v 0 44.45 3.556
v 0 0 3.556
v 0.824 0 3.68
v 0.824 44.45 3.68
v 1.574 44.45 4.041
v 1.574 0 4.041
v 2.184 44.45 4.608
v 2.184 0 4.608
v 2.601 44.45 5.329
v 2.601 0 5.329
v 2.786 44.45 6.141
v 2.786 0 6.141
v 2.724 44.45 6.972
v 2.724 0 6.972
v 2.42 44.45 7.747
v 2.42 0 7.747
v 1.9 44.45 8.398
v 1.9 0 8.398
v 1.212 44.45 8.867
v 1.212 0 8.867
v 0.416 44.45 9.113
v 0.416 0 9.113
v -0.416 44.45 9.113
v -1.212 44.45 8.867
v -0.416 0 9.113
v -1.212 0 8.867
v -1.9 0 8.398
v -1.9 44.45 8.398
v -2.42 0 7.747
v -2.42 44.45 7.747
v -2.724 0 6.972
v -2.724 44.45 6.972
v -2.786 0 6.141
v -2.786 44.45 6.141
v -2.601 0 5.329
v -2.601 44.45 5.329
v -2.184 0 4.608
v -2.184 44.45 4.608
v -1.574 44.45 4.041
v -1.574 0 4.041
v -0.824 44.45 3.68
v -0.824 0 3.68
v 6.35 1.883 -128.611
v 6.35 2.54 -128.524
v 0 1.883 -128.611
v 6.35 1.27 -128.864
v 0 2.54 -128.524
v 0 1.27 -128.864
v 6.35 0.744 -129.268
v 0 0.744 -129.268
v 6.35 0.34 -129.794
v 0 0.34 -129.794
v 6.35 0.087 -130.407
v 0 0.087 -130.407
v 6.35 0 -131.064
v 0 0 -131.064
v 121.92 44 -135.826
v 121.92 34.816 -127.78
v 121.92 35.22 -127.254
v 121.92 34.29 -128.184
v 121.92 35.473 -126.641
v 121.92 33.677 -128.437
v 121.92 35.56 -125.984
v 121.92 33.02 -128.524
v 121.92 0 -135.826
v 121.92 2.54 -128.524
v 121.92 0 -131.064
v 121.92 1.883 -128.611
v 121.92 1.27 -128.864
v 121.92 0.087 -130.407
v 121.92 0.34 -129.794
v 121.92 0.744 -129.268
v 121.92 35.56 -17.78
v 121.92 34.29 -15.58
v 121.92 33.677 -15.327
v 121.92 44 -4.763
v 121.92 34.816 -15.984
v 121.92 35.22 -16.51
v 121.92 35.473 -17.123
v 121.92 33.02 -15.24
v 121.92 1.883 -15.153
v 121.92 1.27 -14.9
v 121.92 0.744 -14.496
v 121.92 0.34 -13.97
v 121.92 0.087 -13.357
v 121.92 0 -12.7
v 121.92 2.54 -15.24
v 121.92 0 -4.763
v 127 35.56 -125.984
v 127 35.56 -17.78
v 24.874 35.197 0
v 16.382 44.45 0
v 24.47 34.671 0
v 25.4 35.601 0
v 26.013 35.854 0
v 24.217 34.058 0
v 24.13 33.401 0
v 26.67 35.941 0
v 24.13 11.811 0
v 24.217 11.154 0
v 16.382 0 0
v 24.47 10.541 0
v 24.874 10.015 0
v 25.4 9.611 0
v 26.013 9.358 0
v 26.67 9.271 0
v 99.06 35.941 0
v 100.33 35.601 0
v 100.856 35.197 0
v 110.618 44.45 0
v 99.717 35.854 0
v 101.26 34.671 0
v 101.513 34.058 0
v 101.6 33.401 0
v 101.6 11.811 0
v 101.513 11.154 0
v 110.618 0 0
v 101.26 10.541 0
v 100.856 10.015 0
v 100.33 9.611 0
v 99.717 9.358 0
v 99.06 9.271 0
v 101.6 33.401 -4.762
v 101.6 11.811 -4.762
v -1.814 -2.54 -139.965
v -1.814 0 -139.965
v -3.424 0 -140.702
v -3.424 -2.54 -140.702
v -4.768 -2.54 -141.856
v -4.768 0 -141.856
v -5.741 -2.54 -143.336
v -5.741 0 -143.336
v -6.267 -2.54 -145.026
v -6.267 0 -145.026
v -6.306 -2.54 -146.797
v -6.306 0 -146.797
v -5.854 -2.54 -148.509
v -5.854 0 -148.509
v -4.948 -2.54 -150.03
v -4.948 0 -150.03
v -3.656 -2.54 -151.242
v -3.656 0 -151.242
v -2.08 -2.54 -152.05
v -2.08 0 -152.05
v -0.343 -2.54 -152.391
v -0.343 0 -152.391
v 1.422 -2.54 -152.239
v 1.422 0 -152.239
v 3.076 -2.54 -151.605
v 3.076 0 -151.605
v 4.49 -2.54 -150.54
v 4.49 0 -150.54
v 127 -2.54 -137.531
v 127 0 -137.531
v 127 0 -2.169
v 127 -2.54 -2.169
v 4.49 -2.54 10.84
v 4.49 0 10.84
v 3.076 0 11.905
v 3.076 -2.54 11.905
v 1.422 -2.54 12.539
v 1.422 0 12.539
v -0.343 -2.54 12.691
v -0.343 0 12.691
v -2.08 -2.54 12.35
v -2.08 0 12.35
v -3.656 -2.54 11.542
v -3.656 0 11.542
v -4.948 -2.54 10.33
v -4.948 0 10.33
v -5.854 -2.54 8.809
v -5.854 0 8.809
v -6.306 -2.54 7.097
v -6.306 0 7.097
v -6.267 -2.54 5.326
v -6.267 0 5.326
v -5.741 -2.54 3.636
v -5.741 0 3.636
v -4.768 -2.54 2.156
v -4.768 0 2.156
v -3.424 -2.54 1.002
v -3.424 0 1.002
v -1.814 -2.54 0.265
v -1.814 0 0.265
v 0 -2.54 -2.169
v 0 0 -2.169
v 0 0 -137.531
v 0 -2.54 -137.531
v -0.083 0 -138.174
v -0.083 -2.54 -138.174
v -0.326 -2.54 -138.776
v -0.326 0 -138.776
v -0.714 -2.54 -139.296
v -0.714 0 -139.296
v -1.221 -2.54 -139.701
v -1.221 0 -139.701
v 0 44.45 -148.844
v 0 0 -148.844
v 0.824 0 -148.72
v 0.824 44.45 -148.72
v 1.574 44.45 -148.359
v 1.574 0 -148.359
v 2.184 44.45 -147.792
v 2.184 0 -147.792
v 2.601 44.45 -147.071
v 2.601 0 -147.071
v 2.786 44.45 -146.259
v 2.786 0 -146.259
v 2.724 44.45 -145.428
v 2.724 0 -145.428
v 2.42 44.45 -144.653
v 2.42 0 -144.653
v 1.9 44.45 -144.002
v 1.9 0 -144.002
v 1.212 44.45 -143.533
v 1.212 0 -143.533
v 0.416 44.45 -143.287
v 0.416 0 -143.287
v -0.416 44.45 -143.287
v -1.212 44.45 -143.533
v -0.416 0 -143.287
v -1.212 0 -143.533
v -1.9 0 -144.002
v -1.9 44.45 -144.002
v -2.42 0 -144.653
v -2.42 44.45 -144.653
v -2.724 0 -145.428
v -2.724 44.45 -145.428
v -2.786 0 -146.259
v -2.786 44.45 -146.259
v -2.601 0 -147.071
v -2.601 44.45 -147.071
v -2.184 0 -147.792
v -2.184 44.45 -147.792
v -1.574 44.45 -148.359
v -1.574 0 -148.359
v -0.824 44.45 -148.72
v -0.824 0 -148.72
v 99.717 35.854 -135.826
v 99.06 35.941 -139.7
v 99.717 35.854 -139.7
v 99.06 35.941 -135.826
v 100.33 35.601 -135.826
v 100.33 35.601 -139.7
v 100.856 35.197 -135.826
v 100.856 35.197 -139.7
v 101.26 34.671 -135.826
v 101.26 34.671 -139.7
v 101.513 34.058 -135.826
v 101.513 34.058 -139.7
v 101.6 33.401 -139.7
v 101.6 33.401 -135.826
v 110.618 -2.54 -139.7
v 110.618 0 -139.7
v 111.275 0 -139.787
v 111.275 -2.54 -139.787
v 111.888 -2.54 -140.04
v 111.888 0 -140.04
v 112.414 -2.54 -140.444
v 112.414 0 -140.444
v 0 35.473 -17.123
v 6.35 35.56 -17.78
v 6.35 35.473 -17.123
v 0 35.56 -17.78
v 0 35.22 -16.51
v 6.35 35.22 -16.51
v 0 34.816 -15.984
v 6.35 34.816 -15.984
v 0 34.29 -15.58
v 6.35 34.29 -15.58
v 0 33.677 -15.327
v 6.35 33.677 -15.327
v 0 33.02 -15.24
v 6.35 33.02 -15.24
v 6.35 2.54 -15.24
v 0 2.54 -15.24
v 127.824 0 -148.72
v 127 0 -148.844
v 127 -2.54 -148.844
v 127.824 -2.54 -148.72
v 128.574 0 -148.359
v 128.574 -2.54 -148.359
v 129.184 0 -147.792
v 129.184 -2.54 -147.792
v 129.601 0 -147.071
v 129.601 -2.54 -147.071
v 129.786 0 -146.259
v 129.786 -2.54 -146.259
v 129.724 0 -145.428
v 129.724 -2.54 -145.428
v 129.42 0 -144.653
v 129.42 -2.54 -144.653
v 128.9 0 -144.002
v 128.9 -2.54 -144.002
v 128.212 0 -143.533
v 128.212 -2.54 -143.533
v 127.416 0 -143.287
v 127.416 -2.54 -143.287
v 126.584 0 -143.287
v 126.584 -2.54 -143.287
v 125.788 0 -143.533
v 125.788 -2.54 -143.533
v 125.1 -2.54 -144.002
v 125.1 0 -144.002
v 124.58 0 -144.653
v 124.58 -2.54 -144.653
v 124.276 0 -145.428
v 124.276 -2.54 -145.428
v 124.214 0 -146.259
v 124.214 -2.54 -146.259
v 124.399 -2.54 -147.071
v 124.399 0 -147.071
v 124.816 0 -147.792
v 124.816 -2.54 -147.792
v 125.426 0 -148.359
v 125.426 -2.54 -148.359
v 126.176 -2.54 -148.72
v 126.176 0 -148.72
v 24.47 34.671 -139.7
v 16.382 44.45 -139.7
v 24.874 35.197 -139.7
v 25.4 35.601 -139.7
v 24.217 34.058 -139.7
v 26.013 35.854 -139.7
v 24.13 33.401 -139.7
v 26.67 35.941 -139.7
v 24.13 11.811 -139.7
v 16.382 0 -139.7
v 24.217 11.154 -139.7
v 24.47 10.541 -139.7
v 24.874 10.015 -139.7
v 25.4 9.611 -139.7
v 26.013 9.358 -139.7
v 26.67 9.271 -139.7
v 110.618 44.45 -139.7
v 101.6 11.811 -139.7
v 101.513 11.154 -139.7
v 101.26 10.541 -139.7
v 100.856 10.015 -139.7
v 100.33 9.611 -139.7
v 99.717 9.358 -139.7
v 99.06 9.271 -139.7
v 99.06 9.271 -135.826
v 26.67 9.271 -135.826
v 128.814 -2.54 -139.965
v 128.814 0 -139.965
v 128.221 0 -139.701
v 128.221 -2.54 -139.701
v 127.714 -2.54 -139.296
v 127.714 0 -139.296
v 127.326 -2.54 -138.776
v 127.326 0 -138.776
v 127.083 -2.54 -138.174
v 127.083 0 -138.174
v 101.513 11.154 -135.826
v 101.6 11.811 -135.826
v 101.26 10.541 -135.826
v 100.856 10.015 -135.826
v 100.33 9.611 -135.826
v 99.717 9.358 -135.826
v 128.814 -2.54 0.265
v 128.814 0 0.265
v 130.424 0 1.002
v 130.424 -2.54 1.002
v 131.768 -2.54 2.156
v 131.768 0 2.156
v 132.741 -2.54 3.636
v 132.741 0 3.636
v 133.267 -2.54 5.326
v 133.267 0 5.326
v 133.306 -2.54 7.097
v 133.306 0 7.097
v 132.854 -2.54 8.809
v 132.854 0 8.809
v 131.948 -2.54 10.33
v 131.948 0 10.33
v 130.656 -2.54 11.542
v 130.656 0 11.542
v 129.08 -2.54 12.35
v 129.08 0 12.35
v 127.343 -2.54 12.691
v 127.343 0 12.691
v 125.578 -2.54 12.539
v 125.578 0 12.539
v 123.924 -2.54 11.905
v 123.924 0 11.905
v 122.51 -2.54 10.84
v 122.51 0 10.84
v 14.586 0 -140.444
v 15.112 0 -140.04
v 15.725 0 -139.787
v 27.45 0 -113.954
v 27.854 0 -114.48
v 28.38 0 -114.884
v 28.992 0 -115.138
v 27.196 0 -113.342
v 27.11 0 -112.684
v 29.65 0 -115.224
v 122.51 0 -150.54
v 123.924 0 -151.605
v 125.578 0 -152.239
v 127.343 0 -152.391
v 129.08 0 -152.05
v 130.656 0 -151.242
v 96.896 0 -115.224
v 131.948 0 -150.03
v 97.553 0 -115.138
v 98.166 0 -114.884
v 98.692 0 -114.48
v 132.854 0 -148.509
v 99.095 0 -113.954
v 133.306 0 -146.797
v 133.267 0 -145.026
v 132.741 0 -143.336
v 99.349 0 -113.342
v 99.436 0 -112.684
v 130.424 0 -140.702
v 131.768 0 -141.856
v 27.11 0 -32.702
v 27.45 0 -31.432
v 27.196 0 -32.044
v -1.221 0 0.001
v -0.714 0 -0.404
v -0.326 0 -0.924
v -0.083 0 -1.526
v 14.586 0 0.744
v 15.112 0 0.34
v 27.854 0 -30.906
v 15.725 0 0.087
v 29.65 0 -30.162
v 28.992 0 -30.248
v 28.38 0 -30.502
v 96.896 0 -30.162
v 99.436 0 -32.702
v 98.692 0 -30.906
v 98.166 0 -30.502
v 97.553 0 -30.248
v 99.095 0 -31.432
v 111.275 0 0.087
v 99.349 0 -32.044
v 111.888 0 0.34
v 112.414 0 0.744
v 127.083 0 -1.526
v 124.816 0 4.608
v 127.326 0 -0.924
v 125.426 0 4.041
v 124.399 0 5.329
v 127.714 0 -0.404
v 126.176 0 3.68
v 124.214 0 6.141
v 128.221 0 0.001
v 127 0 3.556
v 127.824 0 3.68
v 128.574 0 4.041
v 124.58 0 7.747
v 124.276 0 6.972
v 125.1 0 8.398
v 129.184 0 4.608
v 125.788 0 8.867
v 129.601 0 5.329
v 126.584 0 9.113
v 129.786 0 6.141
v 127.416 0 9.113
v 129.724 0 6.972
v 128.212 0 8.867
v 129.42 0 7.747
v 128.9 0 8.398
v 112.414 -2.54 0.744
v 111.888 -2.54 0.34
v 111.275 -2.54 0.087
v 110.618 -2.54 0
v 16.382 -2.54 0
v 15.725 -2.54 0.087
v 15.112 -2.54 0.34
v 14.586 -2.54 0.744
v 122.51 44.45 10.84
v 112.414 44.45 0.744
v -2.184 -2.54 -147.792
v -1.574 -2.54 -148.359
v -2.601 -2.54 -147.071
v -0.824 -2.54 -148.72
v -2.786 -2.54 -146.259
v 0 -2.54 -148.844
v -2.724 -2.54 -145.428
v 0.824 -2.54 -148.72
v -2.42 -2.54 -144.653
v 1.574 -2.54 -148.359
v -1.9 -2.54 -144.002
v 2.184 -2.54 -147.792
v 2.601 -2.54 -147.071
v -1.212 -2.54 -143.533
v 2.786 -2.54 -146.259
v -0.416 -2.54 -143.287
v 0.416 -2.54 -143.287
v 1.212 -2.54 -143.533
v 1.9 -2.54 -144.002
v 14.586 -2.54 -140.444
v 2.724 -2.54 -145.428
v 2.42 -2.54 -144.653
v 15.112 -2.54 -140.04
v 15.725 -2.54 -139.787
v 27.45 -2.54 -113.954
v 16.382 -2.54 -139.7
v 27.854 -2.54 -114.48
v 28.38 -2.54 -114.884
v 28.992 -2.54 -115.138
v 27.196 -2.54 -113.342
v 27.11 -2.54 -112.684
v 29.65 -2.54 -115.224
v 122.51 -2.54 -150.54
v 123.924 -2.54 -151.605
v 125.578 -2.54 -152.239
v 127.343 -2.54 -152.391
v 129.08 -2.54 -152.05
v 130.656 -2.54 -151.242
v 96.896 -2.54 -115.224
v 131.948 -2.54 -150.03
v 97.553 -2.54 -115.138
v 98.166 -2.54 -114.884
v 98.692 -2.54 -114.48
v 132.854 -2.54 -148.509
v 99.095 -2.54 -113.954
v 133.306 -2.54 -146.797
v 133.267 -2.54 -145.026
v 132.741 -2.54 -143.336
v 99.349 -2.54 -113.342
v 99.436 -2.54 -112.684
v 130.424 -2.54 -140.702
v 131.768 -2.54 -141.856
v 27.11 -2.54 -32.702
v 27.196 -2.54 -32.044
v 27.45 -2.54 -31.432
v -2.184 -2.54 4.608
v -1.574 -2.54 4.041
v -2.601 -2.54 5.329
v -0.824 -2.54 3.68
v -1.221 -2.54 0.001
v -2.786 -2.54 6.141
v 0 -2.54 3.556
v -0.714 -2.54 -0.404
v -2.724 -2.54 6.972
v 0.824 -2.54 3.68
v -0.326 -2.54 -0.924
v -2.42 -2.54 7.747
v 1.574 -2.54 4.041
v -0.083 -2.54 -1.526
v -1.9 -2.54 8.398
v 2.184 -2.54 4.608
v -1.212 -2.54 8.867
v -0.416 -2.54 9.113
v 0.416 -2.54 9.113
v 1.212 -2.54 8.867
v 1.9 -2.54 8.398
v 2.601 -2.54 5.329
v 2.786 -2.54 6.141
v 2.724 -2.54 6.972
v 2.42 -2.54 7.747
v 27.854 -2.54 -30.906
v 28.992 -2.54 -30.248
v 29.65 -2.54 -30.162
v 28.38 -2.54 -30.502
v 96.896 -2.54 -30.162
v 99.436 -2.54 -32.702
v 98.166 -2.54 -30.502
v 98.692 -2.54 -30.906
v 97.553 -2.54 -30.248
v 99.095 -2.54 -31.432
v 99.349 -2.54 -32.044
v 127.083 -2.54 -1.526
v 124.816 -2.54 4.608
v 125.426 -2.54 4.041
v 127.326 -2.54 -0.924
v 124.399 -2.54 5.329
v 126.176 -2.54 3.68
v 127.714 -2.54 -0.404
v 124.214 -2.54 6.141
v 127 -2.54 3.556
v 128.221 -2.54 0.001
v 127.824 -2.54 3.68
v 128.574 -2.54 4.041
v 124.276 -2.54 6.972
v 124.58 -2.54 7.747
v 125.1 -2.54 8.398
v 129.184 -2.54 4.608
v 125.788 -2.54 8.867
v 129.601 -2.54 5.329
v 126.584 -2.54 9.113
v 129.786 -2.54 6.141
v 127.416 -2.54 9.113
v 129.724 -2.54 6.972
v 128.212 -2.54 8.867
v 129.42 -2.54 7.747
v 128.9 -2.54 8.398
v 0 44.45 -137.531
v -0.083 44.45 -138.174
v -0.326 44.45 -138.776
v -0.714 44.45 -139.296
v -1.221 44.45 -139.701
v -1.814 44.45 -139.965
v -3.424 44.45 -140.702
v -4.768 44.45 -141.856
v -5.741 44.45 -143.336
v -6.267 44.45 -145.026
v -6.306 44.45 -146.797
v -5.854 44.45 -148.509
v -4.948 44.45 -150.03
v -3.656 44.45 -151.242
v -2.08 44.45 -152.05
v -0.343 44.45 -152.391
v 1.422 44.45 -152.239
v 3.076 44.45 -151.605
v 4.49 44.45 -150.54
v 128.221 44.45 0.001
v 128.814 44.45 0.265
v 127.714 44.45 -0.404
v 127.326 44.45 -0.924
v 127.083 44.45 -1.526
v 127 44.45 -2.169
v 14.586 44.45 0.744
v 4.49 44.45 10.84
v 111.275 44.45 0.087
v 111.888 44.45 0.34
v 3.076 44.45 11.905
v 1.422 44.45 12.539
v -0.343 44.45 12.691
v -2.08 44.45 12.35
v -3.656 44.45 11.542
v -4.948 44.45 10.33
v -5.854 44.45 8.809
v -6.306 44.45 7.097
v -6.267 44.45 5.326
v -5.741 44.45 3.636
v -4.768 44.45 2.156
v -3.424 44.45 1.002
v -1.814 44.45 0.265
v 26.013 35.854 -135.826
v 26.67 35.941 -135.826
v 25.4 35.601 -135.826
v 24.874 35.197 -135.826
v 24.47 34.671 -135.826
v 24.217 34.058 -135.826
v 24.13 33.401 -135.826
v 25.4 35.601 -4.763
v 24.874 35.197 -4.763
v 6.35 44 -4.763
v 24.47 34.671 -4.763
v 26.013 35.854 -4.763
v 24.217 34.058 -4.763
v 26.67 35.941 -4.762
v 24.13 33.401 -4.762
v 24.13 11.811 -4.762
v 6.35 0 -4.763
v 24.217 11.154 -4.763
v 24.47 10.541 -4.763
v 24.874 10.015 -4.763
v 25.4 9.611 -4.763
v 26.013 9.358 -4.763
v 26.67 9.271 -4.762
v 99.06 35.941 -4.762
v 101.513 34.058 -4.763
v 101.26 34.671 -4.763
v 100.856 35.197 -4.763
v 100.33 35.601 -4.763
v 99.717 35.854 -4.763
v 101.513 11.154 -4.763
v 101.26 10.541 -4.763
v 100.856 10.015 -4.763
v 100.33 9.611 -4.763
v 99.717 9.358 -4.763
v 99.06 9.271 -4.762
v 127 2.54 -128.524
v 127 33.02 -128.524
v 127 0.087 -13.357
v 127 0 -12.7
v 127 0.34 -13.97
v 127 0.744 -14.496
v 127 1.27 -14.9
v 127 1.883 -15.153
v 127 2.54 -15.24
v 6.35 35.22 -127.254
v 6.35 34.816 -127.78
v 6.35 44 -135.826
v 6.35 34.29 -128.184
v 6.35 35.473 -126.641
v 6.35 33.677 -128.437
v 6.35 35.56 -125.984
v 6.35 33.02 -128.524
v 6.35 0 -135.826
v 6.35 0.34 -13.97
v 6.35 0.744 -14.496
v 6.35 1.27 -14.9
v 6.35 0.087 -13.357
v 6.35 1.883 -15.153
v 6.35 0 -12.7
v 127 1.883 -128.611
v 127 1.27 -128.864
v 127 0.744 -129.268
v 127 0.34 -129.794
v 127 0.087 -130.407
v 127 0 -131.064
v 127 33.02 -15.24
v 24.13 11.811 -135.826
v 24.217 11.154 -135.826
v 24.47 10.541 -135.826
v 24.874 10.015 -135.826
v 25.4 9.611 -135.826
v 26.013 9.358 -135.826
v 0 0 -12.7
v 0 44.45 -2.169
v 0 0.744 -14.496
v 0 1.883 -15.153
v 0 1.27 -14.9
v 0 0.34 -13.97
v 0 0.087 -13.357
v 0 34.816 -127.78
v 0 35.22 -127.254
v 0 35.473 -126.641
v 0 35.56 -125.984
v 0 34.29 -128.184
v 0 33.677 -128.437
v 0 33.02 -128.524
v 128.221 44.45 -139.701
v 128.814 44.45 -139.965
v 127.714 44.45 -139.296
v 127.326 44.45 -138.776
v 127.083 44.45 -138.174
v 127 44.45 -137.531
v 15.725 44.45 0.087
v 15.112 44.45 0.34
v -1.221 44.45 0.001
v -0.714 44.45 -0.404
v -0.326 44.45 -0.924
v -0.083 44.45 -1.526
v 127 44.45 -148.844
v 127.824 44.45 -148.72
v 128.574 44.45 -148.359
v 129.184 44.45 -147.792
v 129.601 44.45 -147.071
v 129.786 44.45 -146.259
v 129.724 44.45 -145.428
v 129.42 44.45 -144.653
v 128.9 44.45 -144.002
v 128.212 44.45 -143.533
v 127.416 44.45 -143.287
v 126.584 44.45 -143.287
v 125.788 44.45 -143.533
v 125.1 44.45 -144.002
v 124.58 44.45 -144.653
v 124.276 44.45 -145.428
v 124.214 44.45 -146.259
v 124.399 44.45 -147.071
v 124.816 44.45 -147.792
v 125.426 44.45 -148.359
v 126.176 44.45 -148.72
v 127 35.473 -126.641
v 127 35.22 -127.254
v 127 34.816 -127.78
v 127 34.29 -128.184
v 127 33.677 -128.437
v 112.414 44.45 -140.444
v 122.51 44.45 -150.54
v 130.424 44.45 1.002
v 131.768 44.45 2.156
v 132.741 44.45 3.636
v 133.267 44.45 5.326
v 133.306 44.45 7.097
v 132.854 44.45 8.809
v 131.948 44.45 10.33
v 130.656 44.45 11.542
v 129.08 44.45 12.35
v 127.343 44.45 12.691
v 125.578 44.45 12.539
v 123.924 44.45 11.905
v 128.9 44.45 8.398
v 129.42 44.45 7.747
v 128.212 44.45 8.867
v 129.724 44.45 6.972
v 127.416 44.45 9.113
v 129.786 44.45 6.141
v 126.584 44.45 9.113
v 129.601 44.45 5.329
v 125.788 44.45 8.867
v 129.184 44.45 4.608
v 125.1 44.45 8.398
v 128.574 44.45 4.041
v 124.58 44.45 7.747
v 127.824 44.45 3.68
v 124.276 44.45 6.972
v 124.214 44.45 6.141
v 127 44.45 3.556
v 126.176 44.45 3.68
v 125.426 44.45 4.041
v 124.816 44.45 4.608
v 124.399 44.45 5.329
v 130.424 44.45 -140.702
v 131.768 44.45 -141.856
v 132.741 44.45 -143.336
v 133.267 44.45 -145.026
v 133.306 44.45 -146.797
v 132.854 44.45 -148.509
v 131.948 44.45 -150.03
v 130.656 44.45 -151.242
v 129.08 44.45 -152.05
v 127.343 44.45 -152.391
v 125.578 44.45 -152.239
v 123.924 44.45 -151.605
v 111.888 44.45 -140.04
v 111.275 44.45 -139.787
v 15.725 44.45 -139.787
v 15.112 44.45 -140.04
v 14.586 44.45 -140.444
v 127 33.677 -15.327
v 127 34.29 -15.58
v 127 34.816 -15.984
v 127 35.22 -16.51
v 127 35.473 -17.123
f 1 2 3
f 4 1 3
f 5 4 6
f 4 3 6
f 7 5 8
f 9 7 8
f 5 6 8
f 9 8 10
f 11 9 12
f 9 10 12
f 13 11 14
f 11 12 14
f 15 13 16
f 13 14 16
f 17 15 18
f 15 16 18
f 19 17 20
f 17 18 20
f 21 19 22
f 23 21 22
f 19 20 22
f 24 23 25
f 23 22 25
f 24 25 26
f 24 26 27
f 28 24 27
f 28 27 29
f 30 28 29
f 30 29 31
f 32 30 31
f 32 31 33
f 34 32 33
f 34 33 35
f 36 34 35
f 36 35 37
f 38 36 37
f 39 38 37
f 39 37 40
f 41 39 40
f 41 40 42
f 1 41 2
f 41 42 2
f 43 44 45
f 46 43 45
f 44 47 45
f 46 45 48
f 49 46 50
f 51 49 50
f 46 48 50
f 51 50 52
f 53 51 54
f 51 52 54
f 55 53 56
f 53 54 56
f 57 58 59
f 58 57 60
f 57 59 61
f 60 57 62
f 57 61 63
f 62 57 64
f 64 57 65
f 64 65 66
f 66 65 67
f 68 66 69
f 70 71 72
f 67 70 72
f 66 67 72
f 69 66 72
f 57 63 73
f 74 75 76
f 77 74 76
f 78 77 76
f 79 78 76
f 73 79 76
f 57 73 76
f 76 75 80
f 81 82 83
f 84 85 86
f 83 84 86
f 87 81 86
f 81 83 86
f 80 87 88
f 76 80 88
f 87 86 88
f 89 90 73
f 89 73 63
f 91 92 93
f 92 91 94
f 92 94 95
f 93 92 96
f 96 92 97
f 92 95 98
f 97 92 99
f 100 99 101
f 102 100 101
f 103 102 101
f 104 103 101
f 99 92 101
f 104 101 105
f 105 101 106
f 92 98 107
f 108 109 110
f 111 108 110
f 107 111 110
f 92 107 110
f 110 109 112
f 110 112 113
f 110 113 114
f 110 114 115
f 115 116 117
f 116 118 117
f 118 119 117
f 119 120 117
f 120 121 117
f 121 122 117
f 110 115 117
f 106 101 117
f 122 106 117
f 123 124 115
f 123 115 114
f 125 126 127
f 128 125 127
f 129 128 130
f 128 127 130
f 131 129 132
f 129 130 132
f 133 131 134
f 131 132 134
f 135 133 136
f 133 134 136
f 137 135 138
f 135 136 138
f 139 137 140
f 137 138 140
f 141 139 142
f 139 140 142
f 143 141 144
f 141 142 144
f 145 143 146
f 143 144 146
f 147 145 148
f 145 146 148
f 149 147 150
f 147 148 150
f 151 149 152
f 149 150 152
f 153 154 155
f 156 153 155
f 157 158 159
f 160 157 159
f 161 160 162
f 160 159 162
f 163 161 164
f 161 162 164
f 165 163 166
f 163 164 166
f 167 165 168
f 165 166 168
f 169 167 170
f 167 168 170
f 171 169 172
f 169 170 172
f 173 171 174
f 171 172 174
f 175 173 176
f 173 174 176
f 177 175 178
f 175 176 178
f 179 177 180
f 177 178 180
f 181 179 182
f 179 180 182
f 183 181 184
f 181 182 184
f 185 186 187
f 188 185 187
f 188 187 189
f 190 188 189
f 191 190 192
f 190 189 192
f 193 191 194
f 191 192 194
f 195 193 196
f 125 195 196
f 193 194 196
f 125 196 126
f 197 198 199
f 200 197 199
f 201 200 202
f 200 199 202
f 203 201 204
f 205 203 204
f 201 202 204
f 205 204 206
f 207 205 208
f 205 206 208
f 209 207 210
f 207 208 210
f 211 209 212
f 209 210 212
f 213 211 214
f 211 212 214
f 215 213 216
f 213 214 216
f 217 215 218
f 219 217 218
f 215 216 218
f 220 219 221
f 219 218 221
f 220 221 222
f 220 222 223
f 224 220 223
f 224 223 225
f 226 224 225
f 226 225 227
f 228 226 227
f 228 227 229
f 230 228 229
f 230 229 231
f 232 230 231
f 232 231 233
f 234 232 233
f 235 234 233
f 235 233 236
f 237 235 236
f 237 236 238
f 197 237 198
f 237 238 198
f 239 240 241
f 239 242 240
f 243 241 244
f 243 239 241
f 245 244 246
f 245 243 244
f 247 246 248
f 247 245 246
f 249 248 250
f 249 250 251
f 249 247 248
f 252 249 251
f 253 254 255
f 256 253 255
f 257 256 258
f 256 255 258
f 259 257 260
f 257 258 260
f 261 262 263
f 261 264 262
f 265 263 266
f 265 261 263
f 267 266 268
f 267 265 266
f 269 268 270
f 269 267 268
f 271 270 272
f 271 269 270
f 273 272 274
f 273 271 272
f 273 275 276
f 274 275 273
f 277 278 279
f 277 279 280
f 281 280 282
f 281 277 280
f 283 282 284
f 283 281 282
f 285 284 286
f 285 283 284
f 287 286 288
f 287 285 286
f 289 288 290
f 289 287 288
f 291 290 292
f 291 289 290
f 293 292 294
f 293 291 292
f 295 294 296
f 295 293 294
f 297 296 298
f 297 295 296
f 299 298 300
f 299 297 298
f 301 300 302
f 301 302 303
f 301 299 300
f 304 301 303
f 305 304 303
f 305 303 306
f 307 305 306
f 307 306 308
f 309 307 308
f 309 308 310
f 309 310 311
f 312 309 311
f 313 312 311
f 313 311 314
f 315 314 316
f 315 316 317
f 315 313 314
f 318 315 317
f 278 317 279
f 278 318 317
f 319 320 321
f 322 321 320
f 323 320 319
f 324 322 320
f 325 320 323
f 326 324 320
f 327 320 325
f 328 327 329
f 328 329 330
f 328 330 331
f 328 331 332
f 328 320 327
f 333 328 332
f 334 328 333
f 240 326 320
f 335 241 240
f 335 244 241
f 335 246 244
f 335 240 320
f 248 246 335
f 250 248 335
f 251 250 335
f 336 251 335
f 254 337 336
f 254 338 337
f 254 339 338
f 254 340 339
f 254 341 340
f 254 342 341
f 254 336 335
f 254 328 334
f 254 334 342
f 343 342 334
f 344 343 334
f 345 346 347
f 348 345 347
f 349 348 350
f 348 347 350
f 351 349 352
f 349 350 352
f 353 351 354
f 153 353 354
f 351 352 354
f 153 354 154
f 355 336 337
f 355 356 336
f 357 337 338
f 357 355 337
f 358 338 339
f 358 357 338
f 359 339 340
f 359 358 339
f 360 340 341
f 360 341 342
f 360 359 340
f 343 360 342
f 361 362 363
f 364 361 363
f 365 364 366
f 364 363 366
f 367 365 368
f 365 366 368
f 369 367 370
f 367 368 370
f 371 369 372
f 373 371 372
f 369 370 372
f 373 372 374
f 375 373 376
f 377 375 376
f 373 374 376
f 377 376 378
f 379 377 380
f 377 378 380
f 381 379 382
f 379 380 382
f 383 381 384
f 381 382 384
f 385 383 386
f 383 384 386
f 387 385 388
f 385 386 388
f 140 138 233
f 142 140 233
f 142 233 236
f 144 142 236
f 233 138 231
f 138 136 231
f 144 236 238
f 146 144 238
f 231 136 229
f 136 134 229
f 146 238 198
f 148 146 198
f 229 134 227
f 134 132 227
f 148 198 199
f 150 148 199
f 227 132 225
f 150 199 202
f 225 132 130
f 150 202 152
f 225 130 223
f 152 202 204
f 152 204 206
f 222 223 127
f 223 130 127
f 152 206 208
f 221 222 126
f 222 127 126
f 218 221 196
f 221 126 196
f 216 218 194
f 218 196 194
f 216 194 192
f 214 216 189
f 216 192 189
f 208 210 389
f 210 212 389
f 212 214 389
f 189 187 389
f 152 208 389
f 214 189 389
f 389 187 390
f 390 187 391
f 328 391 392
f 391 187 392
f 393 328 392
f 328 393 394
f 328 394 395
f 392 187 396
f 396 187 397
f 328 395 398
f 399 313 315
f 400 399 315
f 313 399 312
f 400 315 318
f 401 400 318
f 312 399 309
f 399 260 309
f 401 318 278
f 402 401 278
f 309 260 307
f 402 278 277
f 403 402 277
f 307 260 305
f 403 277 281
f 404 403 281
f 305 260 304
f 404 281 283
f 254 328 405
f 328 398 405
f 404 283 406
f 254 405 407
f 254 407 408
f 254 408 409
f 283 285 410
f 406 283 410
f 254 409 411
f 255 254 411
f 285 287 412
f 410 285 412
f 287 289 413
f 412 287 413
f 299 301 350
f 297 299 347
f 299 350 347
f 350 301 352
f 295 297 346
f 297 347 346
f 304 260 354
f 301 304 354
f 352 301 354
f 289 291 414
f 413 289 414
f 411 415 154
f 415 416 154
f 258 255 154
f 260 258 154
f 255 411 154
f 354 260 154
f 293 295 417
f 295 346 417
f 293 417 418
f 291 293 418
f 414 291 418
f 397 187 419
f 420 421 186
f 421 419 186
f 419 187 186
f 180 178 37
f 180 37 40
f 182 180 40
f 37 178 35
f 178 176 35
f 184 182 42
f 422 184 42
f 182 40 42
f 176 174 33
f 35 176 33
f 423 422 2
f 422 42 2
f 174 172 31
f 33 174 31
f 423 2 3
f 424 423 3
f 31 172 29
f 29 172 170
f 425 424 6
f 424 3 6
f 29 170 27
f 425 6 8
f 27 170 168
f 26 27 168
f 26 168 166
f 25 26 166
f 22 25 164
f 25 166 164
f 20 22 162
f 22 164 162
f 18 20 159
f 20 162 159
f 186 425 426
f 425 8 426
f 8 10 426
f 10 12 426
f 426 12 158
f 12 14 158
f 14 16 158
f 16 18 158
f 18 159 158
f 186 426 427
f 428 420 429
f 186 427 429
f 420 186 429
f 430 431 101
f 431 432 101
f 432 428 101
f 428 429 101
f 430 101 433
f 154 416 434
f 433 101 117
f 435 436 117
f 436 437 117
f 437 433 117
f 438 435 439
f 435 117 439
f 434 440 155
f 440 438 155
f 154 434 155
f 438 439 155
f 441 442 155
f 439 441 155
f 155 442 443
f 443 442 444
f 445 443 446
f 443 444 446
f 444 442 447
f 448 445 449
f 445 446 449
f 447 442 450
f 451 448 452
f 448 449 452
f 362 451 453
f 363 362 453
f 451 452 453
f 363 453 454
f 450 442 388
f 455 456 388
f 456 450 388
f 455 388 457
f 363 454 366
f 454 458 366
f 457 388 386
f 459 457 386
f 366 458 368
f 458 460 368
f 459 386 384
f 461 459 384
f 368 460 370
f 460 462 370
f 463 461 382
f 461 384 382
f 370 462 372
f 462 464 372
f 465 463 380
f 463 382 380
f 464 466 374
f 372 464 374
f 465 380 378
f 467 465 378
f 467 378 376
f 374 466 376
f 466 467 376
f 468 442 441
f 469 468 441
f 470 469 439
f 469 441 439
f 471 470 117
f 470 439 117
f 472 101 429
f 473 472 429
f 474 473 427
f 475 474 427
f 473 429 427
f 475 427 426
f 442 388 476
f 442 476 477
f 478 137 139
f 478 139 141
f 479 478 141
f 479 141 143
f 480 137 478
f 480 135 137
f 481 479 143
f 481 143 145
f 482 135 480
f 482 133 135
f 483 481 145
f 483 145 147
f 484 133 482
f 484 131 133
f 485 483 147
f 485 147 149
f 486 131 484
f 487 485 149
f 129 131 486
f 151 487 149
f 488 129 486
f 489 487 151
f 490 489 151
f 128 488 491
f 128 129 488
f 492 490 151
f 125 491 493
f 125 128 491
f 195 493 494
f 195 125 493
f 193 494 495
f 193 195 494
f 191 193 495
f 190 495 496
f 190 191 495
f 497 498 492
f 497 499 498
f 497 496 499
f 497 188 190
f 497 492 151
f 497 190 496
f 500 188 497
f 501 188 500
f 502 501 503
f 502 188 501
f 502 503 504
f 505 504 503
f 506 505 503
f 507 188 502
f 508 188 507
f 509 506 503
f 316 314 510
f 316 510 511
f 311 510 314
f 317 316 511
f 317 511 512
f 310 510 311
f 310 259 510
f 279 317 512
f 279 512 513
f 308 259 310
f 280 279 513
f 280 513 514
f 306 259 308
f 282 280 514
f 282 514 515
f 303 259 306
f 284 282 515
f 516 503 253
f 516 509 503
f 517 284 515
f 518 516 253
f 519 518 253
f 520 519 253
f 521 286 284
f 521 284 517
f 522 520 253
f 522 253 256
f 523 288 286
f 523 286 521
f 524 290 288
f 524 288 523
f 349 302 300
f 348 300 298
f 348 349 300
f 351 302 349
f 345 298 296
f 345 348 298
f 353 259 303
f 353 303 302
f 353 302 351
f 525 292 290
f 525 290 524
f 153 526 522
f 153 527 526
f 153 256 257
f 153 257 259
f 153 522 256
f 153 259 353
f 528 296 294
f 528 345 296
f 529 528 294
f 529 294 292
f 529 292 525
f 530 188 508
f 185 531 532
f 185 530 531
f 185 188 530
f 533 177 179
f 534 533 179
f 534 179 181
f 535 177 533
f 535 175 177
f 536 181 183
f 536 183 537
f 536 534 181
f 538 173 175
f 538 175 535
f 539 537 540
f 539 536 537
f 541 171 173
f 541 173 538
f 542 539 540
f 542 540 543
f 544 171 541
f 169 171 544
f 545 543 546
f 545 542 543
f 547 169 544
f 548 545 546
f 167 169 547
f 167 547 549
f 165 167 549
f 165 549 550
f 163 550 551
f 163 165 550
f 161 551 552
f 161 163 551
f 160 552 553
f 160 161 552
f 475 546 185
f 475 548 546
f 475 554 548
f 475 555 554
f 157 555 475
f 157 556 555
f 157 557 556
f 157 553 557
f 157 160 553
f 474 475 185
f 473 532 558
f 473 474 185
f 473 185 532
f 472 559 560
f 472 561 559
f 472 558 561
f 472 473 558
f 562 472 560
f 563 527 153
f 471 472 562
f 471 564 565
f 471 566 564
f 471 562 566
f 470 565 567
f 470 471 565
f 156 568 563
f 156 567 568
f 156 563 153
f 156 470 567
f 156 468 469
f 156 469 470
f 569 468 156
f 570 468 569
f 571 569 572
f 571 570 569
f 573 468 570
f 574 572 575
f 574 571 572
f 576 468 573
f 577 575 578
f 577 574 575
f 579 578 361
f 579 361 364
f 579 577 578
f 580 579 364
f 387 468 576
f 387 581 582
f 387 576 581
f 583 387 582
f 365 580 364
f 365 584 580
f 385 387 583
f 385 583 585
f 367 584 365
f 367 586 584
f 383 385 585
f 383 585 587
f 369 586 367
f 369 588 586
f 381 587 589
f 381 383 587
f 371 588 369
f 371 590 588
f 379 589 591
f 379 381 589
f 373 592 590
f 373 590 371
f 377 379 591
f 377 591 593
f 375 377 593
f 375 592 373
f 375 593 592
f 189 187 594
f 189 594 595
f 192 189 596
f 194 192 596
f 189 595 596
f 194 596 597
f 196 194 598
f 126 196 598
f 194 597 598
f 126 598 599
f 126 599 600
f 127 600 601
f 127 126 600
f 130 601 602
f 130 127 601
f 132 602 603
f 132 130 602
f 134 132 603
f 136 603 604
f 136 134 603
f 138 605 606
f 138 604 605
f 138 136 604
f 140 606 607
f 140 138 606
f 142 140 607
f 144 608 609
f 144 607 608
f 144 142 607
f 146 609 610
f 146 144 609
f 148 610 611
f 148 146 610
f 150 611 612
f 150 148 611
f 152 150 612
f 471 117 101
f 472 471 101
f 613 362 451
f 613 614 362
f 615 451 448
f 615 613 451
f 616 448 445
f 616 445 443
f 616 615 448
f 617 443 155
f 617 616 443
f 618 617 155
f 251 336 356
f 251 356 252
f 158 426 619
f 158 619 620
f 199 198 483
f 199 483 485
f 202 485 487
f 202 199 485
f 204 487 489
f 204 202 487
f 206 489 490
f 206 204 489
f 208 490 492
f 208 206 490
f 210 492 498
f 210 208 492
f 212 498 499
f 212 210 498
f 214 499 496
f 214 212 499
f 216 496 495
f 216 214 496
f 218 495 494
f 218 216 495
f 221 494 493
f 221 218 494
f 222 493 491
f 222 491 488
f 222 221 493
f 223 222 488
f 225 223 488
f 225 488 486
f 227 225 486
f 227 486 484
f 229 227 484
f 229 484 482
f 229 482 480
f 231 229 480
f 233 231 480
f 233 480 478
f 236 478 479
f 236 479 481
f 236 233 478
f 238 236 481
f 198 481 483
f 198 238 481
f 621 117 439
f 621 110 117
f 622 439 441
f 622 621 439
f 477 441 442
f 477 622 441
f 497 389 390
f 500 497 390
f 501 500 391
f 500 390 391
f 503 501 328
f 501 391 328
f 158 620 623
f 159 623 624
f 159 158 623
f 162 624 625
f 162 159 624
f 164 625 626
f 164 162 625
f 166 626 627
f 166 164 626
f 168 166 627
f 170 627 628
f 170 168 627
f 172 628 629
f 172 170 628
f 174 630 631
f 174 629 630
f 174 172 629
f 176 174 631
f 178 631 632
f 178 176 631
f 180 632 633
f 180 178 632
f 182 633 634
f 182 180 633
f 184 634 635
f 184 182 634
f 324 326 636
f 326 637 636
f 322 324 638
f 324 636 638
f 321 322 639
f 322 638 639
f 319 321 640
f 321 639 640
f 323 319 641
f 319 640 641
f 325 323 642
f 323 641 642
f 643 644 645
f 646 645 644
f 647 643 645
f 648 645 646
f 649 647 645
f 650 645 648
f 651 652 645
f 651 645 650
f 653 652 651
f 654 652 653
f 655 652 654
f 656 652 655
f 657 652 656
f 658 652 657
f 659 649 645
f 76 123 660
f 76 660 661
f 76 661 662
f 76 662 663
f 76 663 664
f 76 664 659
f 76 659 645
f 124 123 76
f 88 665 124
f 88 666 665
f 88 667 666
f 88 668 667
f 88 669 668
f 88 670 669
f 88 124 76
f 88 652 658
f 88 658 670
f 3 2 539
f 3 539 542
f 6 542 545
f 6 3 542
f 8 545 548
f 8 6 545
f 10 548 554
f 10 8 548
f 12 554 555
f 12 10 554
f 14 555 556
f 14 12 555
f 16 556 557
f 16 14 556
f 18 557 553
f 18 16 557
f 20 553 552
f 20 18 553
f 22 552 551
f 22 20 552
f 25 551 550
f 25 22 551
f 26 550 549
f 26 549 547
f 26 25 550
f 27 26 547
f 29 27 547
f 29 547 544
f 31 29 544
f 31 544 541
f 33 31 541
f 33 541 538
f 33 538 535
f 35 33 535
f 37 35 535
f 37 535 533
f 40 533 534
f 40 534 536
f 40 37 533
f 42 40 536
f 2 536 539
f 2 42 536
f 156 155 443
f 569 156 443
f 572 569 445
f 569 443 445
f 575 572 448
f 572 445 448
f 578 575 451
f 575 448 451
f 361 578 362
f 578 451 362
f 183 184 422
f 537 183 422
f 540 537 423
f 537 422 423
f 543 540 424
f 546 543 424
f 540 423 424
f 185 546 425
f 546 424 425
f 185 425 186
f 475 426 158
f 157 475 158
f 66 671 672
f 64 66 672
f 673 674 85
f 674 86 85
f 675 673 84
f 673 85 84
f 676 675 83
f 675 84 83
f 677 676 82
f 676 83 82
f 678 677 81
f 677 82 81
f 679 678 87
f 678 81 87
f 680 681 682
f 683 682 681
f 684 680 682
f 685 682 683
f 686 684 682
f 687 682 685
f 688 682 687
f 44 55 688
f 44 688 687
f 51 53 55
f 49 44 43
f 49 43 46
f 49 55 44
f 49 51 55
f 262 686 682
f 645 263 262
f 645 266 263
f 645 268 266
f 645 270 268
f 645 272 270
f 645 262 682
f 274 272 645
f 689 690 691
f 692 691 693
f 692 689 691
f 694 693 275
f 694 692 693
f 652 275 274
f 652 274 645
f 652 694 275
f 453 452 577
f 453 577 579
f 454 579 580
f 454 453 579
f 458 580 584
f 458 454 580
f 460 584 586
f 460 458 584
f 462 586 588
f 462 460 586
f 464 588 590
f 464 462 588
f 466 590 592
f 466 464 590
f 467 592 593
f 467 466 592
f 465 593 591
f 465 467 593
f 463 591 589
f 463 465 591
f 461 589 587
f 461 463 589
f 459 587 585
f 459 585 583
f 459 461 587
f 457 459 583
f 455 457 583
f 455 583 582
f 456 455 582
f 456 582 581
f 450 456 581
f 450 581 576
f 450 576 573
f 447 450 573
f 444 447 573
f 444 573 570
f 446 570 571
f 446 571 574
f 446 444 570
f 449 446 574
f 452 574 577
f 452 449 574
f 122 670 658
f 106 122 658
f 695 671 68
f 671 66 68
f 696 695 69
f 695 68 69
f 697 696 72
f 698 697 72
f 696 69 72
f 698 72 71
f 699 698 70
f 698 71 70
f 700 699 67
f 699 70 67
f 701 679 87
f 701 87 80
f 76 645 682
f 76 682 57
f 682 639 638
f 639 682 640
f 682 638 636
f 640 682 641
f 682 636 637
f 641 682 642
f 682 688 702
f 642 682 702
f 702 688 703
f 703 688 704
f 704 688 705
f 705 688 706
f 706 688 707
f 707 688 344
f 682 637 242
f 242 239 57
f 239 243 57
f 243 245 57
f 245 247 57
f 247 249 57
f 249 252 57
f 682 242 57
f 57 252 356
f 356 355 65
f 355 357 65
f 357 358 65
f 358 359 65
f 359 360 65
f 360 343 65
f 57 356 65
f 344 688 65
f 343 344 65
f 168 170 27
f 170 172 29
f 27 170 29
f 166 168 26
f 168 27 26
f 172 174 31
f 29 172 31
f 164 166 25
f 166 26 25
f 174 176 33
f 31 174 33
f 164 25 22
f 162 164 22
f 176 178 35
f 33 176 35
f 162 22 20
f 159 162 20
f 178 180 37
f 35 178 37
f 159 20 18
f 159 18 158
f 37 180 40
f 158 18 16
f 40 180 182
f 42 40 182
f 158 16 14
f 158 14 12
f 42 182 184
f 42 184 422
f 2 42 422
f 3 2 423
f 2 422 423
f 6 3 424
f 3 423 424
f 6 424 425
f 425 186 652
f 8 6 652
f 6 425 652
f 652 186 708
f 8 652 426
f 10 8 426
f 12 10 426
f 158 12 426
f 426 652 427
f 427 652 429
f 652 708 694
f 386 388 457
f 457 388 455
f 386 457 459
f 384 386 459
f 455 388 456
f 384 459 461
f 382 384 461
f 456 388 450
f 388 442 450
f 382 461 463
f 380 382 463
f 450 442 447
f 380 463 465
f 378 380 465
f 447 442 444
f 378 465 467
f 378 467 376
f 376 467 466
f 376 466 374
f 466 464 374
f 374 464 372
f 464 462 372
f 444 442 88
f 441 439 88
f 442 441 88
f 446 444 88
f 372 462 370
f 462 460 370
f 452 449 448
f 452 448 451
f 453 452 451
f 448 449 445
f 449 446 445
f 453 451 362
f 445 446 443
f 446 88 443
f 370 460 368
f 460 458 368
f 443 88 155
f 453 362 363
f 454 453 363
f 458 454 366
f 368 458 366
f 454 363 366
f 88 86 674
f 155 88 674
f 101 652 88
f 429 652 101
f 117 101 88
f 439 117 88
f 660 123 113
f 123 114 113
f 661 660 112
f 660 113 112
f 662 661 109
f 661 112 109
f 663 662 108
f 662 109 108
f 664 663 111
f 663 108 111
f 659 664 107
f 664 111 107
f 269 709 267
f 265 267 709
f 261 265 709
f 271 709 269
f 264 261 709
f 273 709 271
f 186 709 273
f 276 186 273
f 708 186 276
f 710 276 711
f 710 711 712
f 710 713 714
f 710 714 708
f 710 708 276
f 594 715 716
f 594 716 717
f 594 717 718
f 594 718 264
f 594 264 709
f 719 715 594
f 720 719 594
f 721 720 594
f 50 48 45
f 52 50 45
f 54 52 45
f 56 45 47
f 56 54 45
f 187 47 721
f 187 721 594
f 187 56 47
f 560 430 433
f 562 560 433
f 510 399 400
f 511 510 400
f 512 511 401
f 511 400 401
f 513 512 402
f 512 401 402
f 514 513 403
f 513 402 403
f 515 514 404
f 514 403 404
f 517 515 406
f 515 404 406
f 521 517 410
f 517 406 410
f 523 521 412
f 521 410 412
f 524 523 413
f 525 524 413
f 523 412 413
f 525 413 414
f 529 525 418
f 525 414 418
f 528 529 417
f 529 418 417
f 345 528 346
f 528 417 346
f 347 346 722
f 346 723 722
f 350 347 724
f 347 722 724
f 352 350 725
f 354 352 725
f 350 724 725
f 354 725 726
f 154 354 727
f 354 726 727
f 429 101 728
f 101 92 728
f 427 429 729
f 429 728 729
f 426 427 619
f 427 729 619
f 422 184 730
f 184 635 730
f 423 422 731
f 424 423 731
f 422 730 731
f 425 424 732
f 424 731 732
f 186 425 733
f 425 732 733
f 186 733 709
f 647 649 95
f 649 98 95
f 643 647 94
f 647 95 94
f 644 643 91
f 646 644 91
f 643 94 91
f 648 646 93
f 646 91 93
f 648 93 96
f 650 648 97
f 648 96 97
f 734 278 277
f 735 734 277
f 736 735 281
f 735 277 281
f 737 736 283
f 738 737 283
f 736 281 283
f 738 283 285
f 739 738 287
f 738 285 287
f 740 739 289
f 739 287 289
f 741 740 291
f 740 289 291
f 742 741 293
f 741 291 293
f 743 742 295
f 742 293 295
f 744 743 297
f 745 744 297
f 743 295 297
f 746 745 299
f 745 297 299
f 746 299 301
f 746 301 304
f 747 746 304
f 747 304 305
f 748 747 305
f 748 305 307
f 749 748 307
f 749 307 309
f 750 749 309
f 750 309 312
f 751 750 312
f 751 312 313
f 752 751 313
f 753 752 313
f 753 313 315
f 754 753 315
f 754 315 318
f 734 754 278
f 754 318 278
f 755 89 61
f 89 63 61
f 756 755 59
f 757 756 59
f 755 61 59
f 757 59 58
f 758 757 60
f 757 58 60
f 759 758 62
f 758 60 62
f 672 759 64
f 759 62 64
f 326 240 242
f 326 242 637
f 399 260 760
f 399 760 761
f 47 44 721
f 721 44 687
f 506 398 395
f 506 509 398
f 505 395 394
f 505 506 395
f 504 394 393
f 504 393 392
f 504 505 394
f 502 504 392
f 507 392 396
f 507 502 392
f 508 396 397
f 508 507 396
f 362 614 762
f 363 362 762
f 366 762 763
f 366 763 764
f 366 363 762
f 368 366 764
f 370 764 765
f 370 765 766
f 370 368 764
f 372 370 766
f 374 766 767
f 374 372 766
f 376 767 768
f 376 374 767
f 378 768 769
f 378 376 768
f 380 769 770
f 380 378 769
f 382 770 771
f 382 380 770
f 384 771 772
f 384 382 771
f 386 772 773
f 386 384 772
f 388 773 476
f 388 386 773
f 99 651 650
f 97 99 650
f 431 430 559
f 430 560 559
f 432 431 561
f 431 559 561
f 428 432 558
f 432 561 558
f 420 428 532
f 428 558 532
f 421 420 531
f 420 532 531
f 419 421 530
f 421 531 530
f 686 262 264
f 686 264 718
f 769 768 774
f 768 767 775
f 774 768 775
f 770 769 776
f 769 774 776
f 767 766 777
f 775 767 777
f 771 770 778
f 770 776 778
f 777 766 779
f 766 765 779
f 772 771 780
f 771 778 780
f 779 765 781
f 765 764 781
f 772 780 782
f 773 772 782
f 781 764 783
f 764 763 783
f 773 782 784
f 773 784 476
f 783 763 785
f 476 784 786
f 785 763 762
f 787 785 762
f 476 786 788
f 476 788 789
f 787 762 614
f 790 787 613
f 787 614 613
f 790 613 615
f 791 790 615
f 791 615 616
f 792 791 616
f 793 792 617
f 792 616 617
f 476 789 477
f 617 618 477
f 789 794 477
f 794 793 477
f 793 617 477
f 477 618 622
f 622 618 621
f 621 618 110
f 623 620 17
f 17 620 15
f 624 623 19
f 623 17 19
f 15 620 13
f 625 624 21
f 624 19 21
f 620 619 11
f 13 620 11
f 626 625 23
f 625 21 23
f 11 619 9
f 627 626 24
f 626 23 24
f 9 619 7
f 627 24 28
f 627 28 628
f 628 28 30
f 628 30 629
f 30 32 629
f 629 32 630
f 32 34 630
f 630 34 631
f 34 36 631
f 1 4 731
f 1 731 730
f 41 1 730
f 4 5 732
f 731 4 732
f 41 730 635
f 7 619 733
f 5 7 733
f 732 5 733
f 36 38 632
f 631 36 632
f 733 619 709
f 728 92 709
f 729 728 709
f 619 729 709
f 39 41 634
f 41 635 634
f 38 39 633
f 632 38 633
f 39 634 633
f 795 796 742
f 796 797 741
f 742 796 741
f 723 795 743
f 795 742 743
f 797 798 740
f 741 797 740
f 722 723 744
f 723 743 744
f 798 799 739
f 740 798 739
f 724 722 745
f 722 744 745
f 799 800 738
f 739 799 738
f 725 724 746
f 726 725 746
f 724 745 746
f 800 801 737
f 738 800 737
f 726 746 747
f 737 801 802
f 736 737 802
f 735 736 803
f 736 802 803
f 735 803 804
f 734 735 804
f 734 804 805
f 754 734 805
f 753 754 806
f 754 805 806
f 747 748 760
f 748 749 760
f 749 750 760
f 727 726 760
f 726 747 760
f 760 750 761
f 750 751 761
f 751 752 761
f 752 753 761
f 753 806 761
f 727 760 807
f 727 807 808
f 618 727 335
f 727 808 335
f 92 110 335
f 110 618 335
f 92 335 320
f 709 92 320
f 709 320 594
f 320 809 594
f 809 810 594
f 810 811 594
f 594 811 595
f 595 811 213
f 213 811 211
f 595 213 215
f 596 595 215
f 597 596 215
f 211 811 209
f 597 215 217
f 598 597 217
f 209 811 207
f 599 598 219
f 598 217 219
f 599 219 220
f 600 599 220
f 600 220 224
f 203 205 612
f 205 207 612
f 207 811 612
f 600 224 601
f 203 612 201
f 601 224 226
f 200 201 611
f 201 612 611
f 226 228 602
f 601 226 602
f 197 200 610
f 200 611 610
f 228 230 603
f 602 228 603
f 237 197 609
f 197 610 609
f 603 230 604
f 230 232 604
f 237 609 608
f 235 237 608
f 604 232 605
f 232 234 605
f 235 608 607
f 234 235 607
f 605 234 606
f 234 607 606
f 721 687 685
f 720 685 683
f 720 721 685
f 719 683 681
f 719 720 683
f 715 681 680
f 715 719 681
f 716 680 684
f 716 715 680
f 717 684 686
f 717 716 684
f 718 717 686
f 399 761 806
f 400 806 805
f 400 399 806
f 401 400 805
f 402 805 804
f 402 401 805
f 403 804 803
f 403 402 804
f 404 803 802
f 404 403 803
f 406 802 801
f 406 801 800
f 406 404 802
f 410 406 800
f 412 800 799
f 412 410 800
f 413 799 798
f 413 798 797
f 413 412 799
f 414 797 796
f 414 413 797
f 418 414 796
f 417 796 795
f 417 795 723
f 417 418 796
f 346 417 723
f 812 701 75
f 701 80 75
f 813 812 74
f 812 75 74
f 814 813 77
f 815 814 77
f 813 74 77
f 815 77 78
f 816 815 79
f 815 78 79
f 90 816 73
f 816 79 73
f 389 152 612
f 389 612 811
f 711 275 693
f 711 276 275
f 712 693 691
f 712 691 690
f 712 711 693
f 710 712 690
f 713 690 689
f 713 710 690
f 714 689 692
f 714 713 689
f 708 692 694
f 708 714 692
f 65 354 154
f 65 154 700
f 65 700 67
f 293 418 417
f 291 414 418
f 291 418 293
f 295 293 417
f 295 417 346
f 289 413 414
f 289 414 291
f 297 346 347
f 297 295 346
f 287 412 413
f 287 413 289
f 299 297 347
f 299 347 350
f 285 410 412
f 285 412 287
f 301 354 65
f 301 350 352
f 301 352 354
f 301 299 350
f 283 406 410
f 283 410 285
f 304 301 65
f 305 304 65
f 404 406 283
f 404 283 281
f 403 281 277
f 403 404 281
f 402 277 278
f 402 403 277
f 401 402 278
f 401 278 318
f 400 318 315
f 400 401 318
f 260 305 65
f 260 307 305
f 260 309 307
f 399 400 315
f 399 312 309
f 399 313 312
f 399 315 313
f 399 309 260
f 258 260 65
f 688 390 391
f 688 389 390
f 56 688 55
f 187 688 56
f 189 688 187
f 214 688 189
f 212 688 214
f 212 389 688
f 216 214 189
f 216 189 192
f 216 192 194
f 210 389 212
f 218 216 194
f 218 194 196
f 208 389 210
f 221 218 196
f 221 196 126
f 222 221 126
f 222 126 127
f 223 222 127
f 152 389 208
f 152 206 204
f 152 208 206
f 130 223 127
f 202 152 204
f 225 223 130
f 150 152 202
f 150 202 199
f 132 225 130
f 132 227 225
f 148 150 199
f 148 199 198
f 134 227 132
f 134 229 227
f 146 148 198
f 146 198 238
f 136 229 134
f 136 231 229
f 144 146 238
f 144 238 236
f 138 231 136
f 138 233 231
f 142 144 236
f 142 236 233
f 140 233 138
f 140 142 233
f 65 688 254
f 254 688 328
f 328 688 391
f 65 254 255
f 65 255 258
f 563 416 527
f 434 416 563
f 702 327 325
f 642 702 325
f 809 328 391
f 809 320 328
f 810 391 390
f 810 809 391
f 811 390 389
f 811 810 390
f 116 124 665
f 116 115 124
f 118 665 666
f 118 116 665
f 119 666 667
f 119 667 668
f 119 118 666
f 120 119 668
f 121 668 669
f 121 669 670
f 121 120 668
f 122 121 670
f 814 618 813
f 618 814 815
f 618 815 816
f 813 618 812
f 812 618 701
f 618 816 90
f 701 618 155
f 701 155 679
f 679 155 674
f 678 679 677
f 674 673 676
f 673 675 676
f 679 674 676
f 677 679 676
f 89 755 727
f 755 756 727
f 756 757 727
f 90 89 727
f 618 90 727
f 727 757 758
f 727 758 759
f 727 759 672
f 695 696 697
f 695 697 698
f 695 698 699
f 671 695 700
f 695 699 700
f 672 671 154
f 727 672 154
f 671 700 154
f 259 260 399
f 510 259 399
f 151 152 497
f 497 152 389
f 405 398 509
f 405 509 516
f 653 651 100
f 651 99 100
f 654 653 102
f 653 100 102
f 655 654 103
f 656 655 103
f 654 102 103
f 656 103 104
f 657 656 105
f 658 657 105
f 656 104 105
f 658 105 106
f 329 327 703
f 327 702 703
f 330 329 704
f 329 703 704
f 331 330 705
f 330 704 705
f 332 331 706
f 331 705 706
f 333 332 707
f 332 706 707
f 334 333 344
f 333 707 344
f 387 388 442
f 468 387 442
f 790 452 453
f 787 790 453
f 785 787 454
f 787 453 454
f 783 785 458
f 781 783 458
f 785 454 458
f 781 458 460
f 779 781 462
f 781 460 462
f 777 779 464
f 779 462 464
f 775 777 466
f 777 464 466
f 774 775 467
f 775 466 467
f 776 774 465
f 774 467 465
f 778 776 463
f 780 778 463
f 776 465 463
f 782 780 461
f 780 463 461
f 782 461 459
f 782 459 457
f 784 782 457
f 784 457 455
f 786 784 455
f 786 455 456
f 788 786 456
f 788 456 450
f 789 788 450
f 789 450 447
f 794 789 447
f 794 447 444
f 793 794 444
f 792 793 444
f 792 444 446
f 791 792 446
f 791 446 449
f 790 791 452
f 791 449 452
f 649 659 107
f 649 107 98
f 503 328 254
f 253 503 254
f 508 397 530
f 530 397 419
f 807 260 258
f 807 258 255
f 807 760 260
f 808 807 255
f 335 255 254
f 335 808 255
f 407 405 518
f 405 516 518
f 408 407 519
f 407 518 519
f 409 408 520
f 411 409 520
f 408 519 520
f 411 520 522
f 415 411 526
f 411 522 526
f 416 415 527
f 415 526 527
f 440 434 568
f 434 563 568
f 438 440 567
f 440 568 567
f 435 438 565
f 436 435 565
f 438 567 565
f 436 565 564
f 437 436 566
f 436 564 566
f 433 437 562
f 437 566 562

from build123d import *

# Parameters (mm, degrees)
SKETCH1_W           = 127
SKETCH1_H           = 139.7
BOSS_EXTRUDE1_DEPTH = 44.45
SKETCH3_W           = 115.57
SKETCH3_H           = 131.064
CUT_EXTRUDE1_DEPTH  = 44
SKETCH4_W           = 77.47
SKETCH4_H           = 26.67
CUT_EXTRUDE2_DEPTH  = 190.754
SKETCH5_W           = 113.284
SKETCH5_H           = 46.99
CUT_EXTRUDE3_DEPTH  = 190.754
SKETCH6_R           = 6.35
SKETCH6_R_2         = 2.794
BOSS_EXTRUDE2_DEPTH = 44.45
FILLET1_R           = 2.54
SKETCH7_R           = 2.794
SKETCH7_W           = 72.32591523
SKETCH7_H           = 85.062554391
BOSS_EXTRUDE3_DEPTH = 2.54
FILLET2_R           = 2.54


with BuildPart() as part:
    # Sketch1 → Boss-Extrude1 (new body)
    with BuildSketch(Plane(origin=(0, 0, 0), x_dir=(1, 0, 0), z_dir=(0, 1, 0))):
        with Locations((63.5, 69.85)):
            Rectangle(SKETCH1_W, SKETCH1_H)
    extrude(amount=BOSS_EXTRUDE1_DEPTH)

    # Sketch3 → Cut-Extrude1 (cut)
    with BuildSketch(Plane.XZ):
        with Locations((64.135, -70.2945)):
            Rectangle(SKETCH3_W, SKETCH3_H)
    extrude(amount=-CUT_EXTRUDE1_DEPTH, mode=Mode.SUBTRACT)

    # Sketch4 → Cut-Extrude2 (cut)
    with BuildSketch(Plane(origin=(0, 0, -139.7), x_dir=(-1, 0, 0), z_dir=(0, 0, -1))):
        with Locations((-62.865, 22.606)):
            Rectangle(SKETCH4_W, SKETCH4_H)
    extrude(amount=-CUT_EXTRUDE2_DEPTH, mode=Mode.SUBTRACT)

    # Sketch5 → Cut-Extrude3 (cut)
    with BuildSketch(Plane(origin=(127, 0, 0), x_dir=(0, 0, -1), z_dir=(1, 0, 0))):
        with Locations((71.882, 12.065)):
            Rectangle(SKETCH5_W, SKETCH5_H)
    extrude(amount=-CUT_EXTRUDE3_DEPTH, mode=Mode.SUBTRACT)

    # Sketch6 → Boss-Extrude2 (add, through all)
    # profile 1 of 8: a face of its own
    with BuildSketch(Plane(origin=(0, 0, 0), x_dir=(-1, 0, 0), z_dir=(0, -1, 0))):
        with Locations((-127, 146.05)):
            Circle(SKETCH6_R)
        with Locations(Location((-127, 146.05, 0), (0, 0, 90))):
            Circle(SKETCH6_R_2, mode=Mode.SUBTRACT)
    # profile 2 of 8: a face of its own
    with BuildSketch(Plane(origin=(0, 0, 0), x_dir=(-1, 0, 0), z_dir=(0, -1, 0))):
        with BuildLine():
            Line((-111.669743879, 139.7), (-122.509871939, 150.540128061))
            ThreePointArc((-122.509871939, 150.540128061), (-121.133364969, 148.480039796), (-120.65, 146.05))
            ThreePointArc((-120.65, 146.05), (-122.509871939, 141.559871939), (-127, 139.7))
            Line((-127, 139.7), (-111.669743879, 139.7))
        make_face()
    # profile 3 of 8: a face of its own
    with BuildSketch(Plane(origin=(0, 0, 0), x_dir=(-1, 0, 0), z_dir=(0, -1, 0))):
        with BuildLine():
            Line((-4.490128061, 150.540128061), (-15.330256121, 139.7))
            Line((-15.330256121, 139.7), (0, 139.7))
            ThreePointArc((0, 139.7), (-5.866635031, 143.619960204), (-4.490128061, 150.540128061))
        make_face()
    # profile 4 of 8: a face of its own
    with BuildSketch(Plane(origin=(0, 0, 0), x_dir=(-1, 0, 0), z_dir=(0, -1, 0))):
        with Locations((-127, -6.35)):
            Circle(SKETCH6_R)
        with Locations(Location((-127, -6.35, 0), (0, 0, 90))):
            Circle(SKETCH6_R_2, mode=Mode.SUBTRACT)
    # profile 5 of 8: a face of its own
    with BuildSketch(Plane(origin=(0, 0, 0), x_dir=(-1, 0, 0), z_dir=(0, -1, 0))):
        with BuildLine():
            Line((-122.509871939, -10.840128061), (-111.669743879, 0))
            Line((-111.669743879, 0), (-127, 0))
            ThreePointArc((-127, 0), (-122.509871939, -1.859871939), (-120.65, -6.35))
            ThreePointArc((-120.65, -6.35), (-121.133364969, -8.780039796), (-122.509871939, -10.840128061))
        make_face()
    # profile 6 of 8: a face of its own
    with BuildSketch(Plane(origin=(0, 0, 0), x_dir=(-1, 0, 0), z_dir=(0, -1, 0))):
        with BuildLine():
            Line((-15.330256121, 0), (-4.490128061, -10.840128061))
            ThreePointArc((-4.490128061, -10.840128061), (-5.866635031, -3.919960204), (0, 0))
            Line((0, 0), (-15.330256121, 0))
        make_face()
    # profile 7 of 8: a face of its own
    with BuildSketch(Plane(origin=(0, 0, 0), x_dir=(-1, 0, 0), z_dir=(0, -1, 0))):
        with Locations((0, -6.35)):
            Circle(SKETCH6_R)
        with Locations(Location((0, -6.35, 0), (0, 0, 90))):
            Circle(SKETCH6_R_2, mode=Mode.SUBTRACT)
    # profile 8 of 8: a face of its own
    with BuildSketch(Plane(origin=(0, 0, 0), x_dir=(-1, 0, 0), z_dir=(0, -1, 0))):
        with Locations((0, 146.05)):
            Circle(SKETCH6_R)
        with Locations(Location((0, 146.05, 0), (0, 0, 90))):
            Circle(SKETCH6_R_2, mode=Mode.SUBTRACT)
    extrude(amount=-BOSS_EXTRUDE2_DEPTH)

    # Fillet1
    fillet1_edges = [part.edges().sort_by_distance(p)[0] for p in [
        (111.669743879, 22.225, 0),
        (15.330256121, 22.225, 0),
        (15.330256121, 22.225, -139.7),
        (101.6, 9.271, -2.38125),
        (101.6, 9.271, -137.76325),
        (101.6, 35.941, -2.38125),
        (101.6, 35.941, -137.76325),
        (24.13, 35.941, -2.38125),
        (24.13, 35.941, -137.76325),
        (24.13, 9.271, -2.38125),
        (24.13, 9.271, -137.76325),
        (124.46, 0, -15.24),
        (3.175, 0, -15.24),
        (3.175, 35.56, -15.24),
        (124.46, 35.56, -15.24),
        (3.175, 35.56, -128.524),
        (3.175, 0, -128.524),
        (124.46, 0, -128.524),
        (124.46, 35.56, -128.524),
        (0, 22.225, -139.7),
        (127, 22.225, -139.7),
        (127, 22.225, 0),
        (0, 22.225, 0),
        (111.669743879, 22.225, -139.7),
    ]]
    fillet(fillet1_edges, radius=FILLET1_R)


with BuildPart() as body_2:
    # Sketch7 → Boss-Extrude3 (new body)
    with BuildSketch(Plane.XZ):
        with BuildLine():
            Line((127, -12.7), (127, -2.169418994))
            ThreePointArc((127, -2.169418994), (127.503469337, -0.65147866), (128.814285714, 0.264700718))
            ThreePointArc((128.814285714, 0.264700718), (132.454351376, 9.60154595), (122.509871939, 10.840128061))
            Line((122.509871939, 10.840128061), (112.413692655, 0.743948776))
            ThreePointArc((112.413692655, 0.743948776), (111.589657349, 0.193345987), (110.617641431, 0))
            Line((110.617641431, 0), (16.382358569, 0))
            ThreePointArc((16.382358569, 0), (15.410342651, 0.193345987), (14.586307345, 0.743948776))
            Line((14.586307345, 0.743948776), (4.490128061, 10.840128061))
            ThreePointArc((4.490128061, 10.840128061), (-5.454351376, 9.60154595), (-1.814285714, 0.264700718))
            ThreePointArc((-1.814285714, 0.264700718), (-0.503469337, -0.65147866), (0, -2.169418994))
            Line((0, -2.169418994), (0, -12.7))
            Line((0, -12.7), (0, -131.064))
            Line((0, -131.064), (0, -137.530581006))
            ThreePointArc((0, -137.530581006), (-0.503469337, -139.04852134), (-1.814285714, -139.964700718))
            ThreePointArc((-1.814285714, -139.964700718), (-5.454351376, -149.30154595), (4.490128061, -150.540128061))
            Line((4.490128061, -150.540128061), (14.586307345, -140.443948776))
            ThreePointArc((14.586307345, -140.443948776), (15.410342651, -139.893345987), (16.382358569, -139.7))
            Line((16.382358569, -139.7), (110.617641431, -139.7))
            ThreePointArc((110.617641431, -139.7), (111.589657349, -139.893345987), (112.413692655, -140.443948776))
            Line((112.413692655, -140.443948776), (122.509871939, -150.540128061))
            ThreePointArc((122.509871939, -150.540128061), (132.454351376, -149.30154595), (128.814285714, -139.964700718))
            ThreePointArc((128.814285714, -139.964700718), (127.503469337, -139.04852134), (127, -137.530581006))
            Line((127, -137.530581006), (127, -131.064))
            Line((127, -131.064), (127, -12.7))
        make_face()
        with Locations(Location((127, -146.05, 0), (0, 0, 270))):
            Circle(SKETCH7_R, mode=Mode.SUBTRACT)
        with Locations(Location((0, -146.05, 0), (0, 0, 270))):
            Circle(SKETCH7_R, mode=Mode.SUBTRACT)
        with Locations(Location((127, 6.35, 0), (0, 0, 270))):
            Circle(SKETCH7_R, mode=Mode.SUBTRACT)
        with Locations(Location((0, 6.35, 0), (0, 0, 270))):
            Circle(SKETCH7_R, mode=Mode.SUBTRACT)
        with Locations((63.272560015, -72.692999813)):
            Rectangle(SKETCH7_W, SKETCH7_H, mode=Mode.SUBTRACT)
    extrude(amount=BOSS_EXTRUDE3_DEPTH)

    # Fillet2
    fillet2_edges = [body_2.edges().sort_by_distance(p)[0] for p in [
        (27.1096024, -1.27, -30.161722617),
        (27.1096024, -1.27, -115.224277008),
        (99.43551763, -1.27, -115.224277008),
        (99.43551763, -1.27, -30.161722617),
    ]]
    fillet(fillet2_edges, radius=FILLET2_R)


solid = Compound([part.part, body_2.part])
